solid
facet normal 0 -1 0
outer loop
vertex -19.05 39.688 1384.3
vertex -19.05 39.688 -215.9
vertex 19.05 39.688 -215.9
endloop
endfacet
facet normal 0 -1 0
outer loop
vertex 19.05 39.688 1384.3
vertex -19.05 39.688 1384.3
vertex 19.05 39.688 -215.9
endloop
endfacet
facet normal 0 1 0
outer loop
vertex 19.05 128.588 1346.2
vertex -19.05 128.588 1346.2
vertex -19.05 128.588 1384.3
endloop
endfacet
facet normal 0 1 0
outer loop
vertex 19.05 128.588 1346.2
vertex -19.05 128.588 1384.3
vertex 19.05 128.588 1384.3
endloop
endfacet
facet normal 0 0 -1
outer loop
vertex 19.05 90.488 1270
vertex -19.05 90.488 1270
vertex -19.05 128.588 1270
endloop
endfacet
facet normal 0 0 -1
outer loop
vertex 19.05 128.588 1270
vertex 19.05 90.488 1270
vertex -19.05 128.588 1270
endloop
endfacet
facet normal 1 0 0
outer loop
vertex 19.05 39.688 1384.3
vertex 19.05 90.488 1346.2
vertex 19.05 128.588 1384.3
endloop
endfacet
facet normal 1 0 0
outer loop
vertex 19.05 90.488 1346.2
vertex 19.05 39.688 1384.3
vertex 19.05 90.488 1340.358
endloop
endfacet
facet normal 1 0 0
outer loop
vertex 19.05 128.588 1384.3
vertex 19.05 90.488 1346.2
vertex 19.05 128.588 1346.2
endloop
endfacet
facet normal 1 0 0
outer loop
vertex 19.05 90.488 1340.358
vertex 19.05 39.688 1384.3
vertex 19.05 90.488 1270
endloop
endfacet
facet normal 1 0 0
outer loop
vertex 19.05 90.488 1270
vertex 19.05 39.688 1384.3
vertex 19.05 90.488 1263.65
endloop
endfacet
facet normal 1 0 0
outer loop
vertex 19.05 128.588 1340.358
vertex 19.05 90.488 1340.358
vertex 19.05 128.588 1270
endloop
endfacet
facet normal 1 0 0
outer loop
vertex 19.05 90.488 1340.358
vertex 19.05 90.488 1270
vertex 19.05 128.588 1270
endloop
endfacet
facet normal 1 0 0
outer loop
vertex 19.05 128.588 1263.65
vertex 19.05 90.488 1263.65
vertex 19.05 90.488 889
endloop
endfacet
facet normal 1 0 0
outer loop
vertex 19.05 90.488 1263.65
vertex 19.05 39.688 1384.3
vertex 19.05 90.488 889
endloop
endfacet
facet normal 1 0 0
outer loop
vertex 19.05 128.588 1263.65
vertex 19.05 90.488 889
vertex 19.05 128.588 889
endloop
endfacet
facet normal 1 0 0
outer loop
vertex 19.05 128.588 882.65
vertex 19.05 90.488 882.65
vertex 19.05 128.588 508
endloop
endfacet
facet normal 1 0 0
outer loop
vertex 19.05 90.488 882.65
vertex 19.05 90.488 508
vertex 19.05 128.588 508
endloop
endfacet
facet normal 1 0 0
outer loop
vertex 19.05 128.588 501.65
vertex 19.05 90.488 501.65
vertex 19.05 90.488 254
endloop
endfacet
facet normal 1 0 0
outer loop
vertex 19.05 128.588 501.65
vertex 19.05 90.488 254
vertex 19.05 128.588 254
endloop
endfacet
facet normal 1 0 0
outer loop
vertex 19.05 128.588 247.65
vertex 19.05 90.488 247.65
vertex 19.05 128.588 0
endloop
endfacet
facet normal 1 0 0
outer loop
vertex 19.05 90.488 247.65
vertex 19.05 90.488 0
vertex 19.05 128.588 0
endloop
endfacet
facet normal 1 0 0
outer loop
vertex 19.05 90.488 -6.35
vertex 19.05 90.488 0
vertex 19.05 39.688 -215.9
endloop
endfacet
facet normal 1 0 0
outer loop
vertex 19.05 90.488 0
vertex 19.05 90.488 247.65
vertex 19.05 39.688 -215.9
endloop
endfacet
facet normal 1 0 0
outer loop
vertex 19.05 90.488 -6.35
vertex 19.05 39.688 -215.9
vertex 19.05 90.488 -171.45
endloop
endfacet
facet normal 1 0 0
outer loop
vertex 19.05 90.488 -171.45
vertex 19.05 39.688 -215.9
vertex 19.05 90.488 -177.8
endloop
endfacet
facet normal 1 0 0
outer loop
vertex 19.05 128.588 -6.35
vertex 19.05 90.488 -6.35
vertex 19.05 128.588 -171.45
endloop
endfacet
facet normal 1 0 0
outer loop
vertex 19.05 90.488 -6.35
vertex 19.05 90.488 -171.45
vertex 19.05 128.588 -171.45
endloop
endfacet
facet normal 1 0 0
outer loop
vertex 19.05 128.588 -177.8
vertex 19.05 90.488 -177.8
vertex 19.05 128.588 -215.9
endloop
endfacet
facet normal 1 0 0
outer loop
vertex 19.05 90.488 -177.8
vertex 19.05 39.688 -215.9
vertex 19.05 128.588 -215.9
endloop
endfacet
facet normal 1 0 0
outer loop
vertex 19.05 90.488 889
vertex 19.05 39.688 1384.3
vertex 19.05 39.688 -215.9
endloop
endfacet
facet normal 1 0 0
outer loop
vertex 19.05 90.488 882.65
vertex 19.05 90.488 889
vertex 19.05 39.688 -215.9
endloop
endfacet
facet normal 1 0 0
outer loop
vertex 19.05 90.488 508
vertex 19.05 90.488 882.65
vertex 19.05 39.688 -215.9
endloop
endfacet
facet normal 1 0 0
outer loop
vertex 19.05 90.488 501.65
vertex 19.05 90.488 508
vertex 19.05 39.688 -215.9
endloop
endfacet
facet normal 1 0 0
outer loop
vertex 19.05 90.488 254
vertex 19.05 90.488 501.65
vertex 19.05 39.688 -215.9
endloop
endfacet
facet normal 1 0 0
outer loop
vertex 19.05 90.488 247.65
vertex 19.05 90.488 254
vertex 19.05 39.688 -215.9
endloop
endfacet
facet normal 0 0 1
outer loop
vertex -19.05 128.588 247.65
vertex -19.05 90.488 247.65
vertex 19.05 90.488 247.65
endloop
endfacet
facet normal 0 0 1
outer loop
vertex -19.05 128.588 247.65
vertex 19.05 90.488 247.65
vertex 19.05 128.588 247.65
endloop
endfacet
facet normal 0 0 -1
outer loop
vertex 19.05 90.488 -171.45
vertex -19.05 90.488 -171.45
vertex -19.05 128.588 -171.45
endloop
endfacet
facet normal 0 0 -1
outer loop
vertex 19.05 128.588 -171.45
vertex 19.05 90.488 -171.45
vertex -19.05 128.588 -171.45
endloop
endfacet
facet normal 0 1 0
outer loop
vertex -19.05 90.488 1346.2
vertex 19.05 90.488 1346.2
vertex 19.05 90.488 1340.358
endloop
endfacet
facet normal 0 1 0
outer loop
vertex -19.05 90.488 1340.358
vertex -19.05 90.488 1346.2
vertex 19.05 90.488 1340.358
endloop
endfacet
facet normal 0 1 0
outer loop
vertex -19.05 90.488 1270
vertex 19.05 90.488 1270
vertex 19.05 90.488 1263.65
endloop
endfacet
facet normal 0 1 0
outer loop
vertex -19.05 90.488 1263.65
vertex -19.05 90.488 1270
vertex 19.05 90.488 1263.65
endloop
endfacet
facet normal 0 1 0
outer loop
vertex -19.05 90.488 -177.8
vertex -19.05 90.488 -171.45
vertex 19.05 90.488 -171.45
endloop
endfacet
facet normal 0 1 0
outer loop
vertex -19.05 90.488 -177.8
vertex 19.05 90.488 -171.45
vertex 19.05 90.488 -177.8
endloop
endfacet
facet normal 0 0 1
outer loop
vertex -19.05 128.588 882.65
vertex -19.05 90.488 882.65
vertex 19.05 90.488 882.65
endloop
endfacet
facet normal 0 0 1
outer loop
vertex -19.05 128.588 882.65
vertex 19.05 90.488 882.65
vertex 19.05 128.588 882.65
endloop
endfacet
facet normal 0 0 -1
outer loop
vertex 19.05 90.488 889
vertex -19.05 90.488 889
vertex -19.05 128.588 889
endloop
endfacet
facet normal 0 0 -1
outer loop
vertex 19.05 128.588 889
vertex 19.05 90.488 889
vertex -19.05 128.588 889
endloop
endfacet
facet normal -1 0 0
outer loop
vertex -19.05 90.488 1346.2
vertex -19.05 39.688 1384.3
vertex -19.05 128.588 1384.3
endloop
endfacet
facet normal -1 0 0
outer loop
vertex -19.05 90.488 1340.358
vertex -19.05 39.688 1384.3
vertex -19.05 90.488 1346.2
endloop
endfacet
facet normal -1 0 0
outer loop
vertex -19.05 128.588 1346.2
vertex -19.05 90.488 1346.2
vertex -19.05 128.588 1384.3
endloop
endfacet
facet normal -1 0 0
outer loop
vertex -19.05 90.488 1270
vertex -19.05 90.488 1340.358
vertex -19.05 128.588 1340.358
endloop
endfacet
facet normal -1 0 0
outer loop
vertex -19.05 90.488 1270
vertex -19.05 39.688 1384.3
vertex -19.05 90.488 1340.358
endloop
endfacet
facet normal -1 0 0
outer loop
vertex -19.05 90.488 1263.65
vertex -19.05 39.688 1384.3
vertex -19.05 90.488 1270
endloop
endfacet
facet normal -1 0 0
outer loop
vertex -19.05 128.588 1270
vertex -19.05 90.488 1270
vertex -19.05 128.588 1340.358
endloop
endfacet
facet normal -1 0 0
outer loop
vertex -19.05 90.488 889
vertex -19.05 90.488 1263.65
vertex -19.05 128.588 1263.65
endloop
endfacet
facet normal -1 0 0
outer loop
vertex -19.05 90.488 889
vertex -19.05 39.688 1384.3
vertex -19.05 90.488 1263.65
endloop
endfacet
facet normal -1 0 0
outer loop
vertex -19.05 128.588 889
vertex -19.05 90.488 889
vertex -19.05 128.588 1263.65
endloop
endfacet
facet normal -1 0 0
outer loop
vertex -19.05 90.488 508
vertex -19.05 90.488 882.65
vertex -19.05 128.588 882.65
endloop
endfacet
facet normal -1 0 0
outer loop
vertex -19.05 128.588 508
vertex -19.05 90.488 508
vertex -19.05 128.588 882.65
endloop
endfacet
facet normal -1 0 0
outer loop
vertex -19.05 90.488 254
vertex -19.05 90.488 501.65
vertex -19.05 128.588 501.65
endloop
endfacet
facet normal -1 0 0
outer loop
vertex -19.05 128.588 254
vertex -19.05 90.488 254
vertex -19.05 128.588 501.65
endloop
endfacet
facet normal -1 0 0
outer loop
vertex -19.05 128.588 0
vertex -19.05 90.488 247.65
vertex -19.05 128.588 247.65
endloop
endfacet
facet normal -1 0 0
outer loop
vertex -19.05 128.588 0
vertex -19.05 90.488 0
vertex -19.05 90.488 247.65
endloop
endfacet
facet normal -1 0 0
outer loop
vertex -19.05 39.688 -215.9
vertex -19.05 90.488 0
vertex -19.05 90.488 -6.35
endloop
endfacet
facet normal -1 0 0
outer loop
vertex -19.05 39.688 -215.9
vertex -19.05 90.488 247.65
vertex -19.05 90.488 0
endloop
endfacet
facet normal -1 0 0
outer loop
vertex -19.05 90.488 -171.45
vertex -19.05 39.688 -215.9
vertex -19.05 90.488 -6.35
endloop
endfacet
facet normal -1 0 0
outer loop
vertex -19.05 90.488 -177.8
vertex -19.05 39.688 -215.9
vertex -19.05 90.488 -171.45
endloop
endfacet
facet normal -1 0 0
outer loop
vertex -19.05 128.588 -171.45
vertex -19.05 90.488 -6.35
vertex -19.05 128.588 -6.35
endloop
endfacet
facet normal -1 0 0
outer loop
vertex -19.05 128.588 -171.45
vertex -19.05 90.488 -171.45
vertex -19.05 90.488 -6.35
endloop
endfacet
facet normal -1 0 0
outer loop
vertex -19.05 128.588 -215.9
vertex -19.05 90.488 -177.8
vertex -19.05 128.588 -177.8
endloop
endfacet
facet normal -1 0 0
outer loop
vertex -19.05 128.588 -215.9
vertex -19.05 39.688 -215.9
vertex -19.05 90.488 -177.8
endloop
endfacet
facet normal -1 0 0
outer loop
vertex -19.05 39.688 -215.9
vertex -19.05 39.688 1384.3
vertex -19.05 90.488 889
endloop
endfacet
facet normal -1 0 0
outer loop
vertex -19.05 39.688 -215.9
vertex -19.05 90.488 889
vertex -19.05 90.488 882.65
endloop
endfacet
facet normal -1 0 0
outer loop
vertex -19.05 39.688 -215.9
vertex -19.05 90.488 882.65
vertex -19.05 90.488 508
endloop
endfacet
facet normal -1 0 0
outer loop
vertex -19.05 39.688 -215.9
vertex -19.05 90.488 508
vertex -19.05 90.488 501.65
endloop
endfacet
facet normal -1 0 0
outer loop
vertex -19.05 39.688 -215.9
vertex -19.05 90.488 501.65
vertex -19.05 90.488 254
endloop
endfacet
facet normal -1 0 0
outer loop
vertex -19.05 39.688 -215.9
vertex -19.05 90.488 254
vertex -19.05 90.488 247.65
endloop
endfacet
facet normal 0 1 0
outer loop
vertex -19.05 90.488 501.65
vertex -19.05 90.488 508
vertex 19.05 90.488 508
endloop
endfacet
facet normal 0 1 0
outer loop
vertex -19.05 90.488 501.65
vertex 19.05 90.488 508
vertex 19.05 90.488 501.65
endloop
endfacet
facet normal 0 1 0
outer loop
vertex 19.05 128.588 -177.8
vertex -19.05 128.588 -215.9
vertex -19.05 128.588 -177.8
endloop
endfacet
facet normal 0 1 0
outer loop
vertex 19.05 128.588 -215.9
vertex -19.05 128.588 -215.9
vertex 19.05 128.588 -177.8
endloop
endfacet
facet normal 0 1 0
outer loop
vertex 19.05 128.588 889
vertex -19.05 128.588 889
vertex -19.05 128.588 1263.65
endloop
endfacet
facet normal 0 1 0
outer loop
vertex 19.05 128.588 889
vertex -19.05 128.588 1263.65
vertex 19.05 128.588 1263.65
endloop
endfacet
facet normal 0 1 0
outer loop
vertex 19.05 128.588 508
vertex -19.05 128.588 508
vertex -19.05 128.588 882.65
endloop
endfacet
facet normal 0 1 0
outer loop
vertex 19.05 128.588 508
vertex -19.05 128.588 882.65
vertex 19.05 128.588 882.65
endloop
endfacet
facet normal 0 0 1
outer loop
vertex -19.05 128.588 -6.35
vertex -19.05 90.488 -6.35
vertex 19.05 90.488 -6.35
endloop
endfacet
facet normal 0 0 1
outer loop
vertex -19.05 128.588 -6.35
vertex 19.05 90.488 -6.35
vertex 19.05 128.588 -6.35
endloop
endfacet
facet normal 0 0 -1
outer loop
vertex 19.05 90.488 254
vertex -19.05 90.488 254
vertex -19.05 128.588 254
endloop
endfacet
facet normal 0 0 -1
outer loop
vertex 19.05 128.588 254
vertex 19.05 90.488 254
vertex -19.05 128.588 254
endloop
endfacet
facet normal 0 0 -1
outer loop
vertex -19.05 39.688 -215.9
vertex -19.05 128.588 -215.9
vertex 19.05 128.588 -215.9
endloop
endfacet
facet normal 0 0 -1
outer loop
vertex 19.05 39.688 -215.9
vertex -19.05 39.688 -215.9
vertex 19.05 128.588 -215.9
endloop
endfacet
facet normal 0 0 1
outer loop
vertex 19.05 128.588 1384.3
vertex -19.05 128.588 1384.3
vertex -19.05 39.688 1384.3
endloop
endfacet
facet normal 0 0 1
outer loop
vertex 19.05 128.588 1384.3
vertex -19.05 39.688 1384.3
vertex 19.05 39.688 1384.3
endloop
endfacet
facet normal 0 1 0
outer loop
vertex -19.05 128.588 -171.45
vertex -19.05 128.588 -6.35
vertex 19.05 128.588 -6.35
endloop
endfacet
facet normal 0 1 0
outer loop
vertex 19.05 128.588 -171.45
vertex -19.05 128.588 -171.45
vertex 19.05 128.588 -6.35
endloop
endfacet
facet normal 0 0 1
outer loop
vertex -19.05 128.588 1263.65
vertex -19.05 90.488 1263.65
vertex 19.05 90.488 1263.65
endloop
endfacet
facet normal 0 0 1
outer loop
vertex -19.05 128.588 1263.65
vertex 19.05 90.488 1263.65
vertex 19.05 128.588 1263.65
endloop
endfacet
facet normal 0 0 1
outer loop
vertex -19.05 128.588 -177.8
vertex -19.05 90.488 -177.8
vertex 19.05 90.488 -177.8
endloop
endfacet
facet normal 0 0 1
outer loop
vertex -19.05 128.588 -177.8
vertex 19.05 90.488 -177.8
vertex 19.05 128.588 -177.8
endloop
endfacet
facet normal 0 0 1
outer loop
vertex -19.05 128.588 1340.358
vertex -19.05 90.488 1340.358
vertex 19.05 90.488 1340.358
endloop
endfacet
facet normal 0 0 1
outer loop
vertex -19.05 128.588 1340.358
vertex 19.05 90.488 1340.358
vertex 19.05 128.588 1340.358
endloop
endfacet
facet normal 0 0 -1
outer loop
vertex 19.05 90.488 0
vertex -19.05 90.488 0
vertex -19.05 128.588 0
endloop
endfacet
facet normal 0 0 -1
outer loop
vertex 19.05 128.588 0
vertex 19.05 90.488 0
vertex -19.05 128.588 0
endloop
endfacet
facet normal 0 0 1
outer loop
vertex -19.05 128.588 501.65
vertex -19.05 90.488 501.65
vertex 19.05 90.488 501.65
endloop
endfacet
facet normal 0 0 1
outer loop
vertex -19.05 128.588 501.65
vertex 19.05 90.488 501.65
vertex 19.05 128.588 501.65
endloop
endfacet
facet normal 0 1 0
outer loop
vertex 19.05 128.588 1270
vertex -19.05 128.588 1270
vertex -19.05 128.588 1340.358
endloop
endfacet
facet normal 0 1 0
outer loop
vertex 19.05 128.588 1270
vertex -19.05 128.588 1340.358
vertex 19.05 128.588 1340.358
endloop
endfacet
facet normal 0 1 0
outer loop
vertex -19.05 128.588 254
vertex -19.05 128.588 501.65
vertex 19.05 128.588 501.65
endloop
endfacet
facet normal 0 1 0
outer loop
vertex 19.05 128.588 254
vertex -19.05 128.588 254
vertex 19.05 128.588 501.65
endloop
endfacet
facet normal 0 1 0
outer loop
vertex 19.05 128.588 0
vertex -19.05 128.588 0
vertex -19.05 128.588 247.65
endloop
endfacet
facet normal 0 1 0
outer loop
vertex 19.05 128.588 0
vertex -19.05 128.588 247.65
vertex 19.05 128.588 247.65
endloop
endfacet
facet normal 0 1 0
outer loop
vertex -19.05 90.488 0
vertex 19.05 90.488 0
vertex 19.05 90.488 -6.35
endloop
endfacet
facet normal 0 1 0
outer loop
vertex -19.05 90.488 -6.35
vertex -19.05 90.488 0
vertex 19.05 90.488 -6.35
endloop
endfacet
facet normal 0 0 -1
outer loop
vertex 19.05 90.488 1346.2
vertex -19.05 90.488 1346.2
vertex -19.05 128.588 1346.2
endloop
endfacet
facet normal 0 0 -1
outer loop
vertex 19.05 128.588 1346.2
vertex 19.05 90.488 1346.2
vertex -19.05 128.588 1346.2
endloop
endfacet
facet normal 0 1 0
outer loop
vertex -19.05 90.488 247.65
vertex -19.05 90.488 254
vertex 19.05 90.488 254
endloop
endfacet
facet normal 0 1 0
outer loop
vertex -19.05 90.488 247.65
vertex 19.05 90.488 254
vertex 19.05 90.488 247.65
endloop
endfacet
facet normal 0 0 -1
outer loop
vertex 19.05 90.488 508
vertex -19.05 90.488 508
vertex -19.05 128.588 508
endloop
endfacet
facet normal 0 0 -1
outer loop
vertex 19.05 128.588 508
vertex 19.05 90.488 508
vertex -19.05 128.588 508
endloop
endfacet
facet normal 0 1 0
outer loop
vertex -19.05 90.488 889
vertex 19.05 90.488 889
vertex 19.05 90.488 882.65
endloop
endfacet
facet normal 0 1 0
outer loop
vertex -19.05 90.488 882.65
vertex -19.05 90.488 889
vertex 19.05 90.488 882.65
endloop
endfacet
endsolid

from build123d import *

# Parameters (mm, degrees)
BOSS_EXTRUDE1_DEPTH      = 1384.3
BOSS_EXTRUDE1_DEPTH_BACK = 215.9
SKETCH1_W                = 38.1
SKETCH1_H                = 88.9
SKETCH2_W                = 5.842
SKETCH2_H                = 38.1
SKETCH2_W_2              = 6.35
CUT_EXTRUDE1_DEPTH       = 1391.781379353


with BuildPart() as part:
    # Sketch1 → Boss-Extrude1 (new, two sides: drawn at the far end of the back side and taken through both)
    with BuildSketch(Plane.XY.offset(-BOSS_EXTRUDE1_DEPTH_BACK)):
        with Locations((0, 84.1375)):
            Rectangle(SKETCH1_W, SKETCH1_H)
    extrude(amount=BOSS_EXTRUDE1_DEPTH + BOSS_EXTRUDE1_DEPTH_BACK)

    # Sketch2 → Cut-Extrude1 (cut, through all)
    with BuildSketch(Plane(origin=(19.05, 0, 0), x_dir=(0, 0, -1), z_dir=(1, 0, 0))):
        with Locations((-1343.279, 109.5375)):
            Rectangle(SKETCH2_W, SKETCH2_H)
        with Locations((-1266.825, 109.5375)):
            Rectangle(SKETCH2_W_2, SKETCH2_H)
        with Locations((-885.825, 109.5375)):
            Rectangle(SKETCH2_W_2, SKETCH2_H)
        with Locations((-504.825, 109.5375)):
            Rectangle(SKETCH2_W_2, SKETCH2_H)
        with Locations((-250.825, 109.5375)):
            Rectangle(SKETCH2_W_2, SKETCH2_H)
        with Locations((3.175, 109.5375)):
            Rectangle(SKETCH2_W_2, SKETCH2_H)
        with Locations((174.625, 109.5375)):
            Rectangle(SKETCH2_W_2, SKETCH2_H)
    extrude(amount=-CUT_EXTRUDE1_DEPTH, mode=Mode.SUBTRACT)


solid = part.part
